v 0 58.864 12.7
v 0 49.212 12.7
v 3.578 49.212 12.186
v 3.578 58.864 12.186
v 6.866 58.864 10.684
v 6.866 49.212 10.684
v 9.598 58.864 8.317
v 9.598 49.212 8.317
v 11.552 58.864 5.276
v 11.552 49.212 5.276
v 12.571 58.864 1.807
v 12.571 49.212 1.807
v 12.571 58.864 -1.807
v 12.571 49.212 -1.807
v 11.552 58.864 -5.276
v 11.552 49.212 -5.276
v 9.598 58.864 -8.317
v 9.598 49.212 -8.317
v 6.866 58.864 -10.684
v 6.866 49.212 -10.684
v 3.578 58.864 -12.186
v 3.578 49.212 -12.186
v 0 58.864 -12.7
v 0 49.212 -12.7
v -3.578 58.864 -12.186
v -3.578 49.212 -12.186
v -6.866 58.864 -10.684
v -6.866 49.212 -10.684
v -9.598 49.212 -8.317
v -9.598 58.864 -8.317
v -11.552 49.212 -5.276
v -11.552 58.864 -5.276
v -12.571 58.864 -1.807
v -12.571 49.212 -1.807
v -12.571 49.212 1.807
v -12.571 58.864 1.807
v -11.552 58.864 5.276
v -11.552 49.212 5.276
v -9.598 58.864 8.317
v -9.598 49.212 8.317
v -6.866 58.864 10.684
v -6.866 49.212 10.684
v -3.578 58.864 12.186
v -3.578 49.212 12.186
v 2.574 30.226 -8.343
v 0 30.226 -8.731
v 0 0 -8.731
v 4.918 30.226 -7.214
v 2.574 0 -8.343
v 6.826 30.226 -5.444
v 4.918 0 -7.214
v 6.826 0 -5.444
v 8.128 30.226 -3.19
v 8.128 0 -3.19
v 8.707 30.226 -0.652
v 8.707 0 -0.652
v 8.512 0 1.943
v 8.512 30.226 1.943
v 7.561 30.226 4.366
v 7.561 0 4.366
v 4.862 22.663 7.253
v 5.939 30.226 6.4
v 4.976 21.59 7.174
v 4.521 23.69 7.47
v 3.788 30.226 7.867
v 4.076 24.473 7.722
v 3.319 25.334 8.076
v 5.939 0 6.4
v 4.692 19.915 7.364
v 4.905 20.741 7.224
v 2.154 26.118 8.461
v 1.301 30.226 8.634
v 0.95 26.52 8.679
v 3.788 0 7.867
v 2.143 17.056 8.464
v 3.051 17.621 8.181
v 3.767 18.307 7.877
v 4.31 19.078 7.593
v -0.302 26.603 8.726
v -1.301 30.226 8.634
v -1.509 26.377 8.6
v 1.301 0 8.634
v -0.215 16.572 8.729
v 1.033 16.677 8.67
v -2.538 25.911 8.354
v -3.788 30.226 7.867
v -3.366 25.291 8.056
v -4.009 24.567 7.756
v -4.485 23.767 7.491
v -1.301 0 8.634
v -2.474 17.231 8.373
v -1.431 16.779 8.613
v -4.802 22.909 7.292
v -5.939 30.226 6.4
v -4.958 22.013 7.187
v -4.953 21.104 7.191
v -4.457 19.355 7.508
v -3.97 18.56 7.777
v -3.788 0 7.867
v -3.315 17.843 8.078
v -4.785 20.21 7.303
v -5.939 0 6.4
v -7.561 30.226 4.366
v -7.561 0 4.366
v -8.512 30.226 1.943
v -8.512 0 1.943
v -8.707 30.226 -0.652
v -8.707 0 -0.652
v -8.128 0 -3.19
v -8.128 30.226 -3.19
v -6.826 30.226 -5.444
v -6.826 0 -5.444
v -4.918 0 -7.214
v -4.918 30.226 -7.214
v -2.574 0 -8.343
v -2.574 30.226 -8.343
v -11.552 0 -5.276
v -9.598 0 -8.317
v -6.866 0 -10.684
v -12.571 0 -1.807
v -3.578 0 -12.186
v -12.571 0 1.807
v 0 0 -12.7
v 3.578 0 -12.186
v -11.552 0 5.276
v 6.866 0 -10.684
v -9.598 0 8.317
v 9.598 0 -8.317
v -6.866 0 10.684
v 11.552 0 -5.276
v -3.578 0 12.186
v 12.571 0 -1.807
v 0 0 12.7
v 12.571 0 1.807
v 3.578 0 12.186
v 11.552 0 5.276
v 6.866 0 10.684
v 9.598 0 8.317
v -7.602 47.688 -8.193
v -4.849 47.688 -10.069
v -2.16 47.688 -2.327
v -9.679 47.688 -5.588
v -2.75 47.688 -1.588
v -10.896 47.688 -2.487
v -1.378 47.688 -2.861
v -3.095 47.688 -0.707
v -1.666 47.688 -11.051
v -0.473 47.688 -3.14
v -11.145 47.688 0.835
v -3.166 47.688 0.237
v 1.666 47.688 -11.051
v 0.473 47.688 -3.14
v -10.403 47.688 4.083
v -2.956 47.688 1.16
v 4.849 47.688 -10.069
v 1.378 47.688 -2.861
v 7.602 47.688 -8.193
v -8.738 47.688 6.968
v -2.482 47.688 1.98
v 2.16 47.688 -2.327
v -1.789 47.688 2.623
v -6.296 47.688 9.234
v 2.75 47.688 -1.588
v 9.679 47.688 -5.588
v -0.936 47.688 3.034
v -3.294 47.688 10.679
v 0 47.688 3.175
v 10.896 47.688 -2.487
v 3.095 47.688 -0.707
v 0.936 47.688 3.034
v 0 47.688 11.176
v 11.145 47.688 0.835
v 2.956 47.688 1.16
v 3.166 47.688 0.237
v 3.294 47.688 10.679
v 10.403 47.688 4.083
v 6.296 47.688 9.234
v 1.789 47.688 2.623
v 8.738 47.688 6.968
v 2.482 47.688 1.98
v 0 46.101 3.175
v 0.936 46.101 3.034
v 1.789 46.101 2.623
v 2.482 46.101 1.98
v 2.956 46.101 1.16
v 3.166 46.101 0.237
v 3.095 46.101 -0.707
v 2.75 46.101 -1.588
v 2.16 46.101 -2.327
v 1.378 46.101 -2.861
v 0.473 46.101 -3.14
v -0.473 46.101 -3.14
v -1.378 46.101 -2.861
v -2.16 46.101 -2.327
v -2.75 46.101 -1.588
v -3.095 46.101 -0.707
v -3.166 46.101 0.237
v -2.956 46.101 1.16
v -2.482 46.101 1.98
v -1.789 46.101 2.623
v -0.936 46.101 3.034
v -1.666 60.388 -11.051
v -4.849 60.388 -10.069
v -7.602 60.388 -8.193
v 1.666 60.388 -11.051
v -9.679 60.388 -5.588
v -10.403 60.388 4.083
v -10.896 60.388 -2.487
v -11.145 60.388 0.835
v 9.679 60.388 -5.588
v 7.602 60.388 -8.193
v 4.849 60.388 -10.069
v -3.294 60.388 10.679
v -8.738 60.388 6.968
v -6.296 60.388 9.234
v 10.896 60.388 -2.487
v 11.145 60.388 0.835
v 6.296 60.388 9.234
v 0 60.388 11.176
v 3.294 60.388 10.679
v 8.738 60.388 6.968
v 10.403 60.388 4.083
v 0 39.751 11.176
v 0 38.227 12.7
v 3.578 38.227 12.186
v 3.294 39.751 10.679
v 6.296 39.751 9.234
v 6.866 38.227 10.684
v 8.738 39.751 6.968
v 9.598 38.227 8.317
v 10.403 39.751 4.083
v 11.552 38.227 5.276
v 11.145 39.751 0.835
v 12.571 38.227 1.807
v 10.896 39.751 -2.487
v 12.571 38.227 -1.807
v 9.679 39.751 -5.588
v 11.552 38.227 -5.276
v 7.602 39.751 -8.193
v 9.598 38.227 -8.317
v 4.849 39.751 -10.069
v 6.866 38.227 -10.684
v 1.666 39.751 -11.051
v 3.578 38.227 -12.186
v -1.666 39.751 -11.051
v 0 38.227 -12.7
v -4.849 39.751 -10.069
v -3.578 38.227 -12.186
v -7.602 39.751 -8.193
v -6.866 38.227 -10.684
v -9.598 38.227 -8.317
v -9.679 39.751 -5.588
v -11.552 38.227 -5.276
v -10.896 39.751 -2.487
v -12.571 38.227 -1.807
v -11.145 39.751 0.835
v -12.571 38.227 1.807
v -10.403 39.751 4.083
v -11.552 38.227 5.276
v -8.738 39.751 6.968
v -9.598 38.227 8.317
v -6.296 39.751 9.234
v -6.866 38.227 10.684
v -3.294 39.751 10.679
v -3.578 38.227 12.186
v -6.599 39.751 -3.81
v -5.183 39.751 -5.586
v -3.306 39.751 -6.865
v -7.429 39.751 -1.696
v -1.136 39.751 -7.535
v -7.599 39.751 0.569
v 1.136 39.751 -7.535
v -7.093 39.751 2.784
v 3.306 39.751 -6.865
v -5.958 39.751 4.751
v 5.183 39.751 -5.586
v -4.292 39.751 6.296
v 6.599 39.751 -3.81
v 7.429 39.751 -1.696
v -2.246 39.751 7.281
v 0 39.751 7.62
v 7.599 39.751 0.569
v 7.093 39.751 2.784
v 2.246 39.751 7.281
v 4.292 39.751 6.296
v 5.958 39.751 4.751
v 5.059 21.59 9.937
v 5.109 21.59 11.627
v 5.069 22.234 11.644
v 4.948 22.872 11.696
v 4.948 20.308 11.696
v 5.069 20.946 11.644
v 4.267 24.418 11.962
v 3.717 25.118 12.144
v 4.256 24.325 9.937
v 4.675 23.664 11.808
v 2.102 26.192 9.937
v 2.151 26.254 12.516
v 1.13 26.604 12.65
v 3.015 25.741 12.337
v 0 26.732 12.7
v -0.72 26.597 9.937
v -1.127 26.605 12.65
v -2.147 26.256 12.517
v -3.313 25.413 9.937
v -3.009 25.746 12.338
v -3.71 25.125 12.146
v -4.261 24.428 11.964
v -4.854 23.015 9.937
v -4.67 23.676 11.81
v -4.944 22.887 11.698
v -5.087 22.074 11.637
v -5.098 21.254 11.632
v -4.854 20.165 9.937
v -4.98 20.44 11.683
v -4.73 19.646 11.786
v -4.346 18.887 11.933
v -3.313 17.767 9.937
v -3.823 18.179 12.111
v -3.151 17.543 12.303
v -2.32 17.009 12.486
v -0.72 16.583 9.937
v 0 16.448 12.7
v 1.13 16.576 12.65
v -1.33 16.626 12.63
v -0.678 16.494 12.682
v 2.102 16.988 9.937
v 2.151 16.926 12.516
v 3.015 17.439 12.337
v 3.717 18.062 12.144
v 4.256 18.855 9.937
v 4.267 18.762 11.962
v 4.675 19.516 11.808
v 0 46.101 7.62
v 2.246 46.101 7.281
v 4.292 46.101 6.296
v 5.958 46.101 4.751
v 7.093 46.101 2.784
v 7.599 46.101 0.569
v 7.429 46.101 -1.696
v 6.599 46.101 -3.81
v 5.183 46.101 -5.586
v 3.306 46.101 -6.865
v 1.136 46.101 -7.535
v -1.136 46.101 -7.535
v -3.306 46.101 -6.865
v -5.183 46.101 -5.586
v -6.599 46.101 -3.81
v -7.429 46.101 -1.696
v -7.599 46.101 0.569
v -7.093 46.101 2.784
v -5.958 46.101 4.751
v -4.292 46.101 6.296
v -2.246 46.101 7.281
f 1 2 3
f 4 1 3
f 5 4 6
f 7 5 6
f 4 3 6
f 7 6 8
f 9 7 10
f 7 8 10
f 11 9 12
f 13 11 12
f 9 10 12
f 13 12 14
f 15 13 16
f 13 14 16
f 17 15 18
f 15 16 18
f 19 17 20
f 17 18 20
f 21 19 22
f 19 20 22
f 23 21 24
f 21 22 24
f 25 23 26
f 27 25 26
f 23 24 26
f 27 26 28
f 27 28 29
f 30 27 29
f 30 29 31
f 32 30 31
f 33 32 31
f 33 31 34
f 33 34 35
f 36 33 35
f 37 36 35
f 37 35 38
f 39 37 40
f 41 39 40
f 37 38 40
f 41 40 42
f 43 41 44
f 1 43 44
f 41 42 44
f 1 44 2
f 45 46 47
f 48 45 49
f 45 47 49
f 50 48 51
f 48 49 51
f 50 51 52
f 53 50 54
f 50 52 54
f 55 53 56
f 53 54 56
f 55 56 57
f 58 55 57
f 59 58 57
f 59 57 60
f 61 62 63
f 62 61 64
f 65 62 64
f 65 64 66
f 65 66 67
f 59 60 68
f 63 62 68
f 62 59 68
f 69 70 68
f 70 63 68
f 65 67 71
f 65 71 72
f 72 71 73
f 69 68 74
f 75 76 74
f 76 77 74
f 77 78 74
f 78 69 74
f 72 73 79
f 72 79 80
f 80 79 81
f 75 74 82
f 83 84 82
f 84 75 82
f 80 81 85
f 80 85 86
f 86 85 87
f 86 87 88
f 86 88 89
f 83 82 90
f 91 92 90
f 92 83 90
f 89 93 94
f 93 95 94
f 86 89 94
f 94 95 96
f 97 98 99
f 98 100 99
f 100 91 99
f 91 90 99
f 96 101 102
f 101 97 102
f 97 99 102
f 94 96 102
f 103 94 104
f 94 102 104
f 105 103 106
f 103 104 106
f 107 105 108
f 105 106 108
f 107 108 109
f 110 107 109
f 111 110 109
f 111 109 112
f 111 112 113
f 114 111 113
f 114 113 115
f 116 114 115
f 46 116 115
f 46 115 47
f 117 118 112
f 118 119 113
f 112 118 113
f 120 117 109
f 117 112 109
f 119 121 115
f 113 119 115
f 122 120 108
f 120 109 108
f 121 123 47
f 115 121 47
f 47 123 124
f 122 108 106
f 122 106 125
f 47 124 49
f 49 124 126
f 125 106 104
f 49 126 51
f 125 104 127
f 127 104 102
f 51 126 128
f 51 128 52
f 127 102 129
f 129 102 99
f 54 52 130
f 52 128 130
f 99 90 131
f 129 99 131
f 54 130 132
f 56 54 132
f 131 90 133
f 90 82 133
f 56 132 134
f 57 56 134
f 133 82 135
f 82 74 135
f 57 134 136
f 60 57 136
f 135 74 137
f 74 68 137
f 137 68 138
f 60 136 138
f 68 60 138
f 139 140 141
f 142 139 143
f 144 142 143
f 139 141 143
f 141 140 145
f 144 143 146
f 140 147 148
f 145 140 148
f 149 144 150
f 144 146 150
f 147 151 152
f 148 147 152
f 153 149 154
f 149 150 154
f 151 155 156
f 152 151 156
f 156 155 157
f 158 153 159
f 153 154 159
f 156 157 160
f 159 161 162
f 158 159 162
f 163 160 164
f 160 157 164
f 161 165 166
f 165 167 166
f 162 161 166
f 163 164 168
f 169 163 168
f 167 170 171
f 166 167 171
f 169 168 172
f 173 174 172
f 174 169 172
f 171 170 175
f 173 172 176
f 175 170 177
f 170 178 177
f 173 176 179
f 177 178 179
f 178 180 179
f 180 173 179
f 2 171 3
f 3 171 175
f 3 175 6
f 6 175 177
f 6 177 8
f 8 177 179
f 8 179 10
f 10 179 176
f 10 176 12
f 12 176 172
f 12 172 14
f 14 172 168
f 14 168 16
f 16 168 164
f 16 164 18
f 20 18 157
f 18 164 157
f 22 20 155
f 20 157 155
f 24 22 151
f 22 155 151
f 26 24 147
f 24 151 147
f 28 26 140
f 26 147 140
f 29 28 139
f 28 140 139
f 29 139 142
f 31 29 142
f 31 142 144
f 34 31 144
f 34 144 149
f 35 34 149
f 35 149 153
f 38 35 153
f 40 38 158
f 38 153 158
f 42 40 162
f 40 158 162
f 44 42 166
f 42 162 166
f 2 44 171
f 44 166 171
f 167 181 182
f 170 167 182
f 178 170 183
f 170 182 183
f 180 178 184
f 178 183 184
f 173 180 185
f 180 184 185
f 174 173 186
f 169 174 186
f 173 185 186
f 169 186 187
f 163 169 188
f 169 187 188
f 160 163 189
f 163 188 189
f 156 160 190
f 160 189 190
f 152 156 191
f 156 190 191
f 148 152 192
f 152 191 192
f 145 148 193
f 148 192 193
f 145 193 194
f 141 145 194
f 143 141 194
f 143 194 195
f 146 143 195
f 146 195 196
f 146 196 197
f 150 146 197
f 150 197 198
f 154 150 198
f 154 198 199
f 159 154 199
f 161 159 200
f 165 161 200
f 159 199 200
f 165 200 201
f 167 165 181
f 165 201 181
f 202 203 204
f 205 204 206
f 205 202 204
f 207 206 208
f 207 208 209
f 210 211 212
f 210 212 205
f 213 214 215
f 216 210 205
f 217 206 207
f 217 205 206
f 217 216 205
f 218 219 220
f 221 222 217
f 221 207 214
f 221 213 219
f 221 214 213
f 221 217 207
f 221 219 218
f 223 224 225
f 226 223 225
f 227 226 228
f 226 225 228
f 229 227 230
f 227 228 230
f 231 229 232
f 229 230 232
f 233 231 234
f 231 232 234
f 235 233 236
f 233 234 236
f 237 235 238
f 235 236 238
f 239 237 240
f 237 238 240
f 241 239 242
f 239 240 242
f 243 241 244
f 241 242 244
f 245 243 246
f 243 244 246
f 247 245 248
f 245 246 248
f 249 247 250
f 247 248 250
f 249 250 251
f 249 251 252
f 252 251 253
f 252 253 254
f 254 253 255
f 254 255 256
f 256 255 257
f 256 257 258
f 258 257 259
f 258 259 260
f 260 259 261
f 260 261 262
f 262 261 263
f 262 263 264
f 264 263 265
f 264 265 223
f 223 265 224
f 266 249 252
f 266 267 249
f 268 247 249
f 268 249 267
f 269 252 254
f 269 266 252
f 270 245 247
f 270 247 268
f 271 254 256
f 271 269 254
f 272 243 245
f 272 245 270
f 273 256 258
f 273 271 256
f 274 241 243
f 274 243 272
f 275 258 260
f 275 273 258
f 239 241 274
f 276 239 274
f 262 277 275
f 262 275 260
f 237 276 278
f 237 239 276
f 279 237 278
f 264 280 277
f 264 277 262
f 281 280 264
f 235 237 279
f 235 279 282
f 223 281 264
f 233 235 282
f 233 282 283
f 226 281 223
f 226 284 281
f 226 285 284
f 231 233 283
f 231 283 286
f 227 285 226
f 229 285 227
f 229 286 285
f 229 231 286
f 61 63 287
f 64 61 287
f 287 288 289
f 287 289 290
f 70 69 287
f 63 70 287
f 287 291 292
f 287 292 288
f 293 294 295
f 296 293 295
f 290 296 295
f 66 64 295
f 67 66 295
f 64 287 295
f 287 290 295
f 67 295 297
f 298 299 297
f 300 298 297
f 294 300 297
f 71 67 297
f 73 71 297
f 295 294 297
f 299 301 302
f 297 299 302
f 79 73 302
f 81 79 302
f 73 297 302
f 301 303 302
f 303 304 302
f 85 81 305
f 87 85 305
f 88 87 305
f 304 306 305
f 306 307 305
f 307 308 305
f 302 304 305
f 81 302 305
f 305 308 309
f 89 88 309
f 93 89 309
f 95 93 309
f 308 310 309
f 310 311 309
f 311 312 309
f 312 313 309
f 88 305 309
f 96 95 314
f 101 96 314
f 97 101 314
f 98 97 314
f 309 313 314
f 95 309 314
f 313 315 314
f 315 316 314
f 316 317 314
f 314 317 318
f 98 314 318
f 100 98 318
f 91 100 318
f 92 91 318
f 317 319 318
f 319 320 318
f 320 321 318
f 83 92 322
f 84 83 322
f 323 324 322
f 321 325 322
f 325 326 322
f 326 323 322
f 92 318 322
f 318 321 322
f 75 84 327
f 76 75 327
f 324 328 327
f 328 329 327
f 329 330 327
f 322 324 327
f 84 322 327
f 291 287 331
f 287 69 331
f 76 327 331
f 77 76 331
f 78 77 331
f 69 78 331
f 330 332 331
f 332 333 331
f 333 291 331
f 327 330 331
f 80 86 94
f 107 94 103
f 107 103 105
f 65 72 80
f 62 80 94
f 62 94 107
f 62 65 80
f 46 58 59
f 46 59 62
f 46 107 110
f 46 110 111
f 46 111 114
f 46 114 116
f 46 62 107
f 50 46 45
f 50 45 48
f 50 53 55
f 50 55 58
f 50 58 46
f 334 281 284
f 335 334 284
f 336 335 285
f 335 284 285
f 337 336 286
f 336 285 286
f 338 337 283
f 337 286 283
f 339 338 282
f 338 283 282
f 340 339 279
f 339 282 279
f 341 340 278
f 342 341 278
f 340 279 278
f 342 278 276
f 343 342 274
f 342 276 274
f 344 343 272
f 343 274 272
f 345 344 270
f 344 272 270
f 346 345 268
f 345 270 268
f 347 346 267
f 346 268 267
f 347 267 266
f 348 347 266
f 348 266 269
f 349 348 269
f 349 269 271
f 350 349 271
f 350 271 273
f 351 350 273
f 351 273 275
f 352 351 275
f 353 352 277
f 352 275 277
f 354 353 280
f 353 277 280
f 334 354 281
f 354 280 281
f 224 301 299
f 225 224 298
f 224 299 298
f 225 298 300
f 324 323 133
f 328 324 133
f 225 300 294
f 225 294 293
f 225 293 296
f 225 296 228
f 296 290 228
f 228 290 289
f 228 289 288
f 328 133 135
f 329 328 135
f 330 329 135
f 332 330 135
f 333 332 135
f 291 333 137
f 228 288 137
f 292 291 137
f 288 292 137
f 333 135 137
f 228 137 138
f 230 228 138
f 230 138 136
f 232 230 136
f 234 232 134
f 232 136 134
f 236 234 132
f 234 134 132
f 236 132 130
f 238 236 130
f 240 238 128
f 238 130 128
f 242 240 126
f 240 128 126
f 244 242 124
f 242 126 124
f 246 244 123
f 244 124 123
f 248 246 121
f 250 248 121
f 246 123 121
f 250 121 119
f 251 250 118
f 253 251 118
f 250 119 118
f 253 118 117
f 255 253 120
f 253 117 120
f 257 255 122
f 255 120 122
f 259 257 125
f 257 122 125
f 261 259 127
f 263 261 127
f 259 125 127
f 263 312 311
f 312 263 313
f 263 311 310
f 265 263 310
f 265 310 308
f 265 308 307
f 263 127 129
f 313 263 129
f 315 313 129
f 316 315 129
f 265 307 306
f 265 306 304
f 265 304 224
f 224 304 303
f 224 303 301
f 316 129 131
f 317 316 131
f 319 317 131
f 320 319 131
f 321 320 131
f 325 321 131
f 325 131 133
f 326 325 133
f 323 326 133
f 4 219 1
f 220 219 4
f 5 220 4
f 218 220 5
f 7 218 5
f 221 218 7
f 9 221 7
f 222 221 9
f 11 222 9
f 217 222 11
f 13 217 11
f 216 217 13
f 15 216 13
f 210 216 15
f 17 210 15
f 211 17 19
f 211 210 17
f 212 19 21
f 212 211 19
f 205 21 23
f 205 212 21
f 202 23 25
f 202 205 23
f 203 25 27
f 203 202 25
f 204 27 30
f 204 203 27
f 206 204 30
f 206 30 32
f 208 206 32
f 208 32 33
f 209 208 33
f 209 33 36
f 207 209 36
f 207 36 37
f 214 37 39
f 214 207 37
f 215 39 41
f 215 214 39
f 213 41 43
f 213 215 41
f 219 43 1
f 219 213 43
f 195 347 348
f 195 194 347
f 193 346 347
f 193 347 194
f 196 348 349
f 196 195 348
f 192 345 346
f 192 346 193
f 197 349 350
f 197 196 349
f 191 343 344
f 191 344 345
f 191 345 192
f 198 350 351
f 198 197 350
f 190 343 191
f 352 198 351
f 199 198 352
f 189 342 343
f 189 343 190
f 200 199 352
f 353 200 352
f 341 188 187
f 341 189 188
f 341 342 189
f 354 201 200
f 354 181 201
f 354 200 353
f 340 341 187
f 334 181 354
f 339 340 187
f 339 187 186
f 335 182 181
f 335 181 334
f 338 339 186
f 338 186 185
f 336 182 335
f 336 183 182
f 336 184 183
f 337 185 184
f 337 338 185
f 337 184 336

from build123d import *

# Parameters (mm, degrees)
SKETCH1_R           = 12.7
BOSS_EXTRUDE1_DEPTH = 39.751
SKETCH2_R           = 8.73125
CUT_EXTRUDE1_DEPTH  = 30.226
SKETCH4_R           = 7.62
BOSS_EXTRUDE2_DEPTH = 6.35
SKETCH5_R           = 3.175
BOSS_EXTRUDE3_DEPTH = 1.5875
SKETCH7_R           = 12.7
BOSS_EXTRUDE4_DEPTH = 12.7
CHAMFER1_SIZE       = 1.524


# Read off the part's stored shape, not the designer's step: 1/8 NPT Tapped Hole1
with BuildPart() as part:
    # Sketch1 → Boss-Extrude1 (new body)
    with BuildSketch(Plane(origin=(0, 0, 0), x_dir=(1, 0, 0), z_dir=(0, 1, 0))):
        with Locations(Location((0, 0, 0), (0, 0, 270))):
            Circle(SKETCH1_R)
    extrude(amount=BOSS_EXTRUDE1_DEPTH)

    # Sketch2 → Cut-Extrude1 (cut)
    with BuildSketch(Plane.XZ):
        with Locations(Location((0, 0, 0), (0, 0, 270))):
            Circle(SKETCH2_R)
    extrude(amount=-CUT_EXTRUDE1_DEPTH, mode=Mode.SUBTRACT)

    # Sketch4 → Boss-Extrude2 (add)
    with BuildSketch(Plane(origin=(0, 39.751, 0), x_dir=(1, 0, 0), z_dir=(0, 1, 0))):
        with Locations(Location((0, 0, 0), (0, 0, 270))):
            Circle(SKETCH4_R)
    extrude(amount=BOSS_EXTRUDE2_DEPTH)

    # Sketch5 → Boss-Extrude3 (add)
    with BuildSketch(Plane(origin=(0, 46.101, 0), x_dir=(1, 0, 0), z_dir=(0, 1, 0))):
        with Locations(Location((0, 0, 0), (0, 0, 270))):
            Circle(SKETCH5_R)
    extrude(amount=BOSS_EXTRUDE3_DEPTH)

    # Sketch7 → Boss-Extrude4 (add)
    with BuildSketch(Plane(origin=(0, 47.6885, 0), x_dir=(1, 0, 0), z_dir=(0, 1, 0))):
        with Locations(Location((0, 0, 0), (0, 0, 270))):
            Circle(SKETCH7_R)
    extrude(amount=BOSS_EXTRUDE4_DEPTH)

    # Chamfer1
    chamfer1_edges = [part.edges().sort_by_distance(p)[0] for p in [
        (0, 47.6885, -12.7),
        (0, 60.3885, -12.7),
        (0, 39.751, -12.7),
    ]]
    chamfer(chamfer1_edges, length=CHAMFER1_SIZE)

    # 1/8 NPT Tapped Hole1 outline → 1/8 NPT Tapped Hole1 (revolve, cut)
    with BuildSketch(Plane.XZ.offset(-21.59)):
        Polygon((5.141518805, 12.700000181), (0, 12.700000181), (0, 7.174156466), (4.976067645, 7.174156466), align=None)
    revolve(axis=Axis((0, 21.59, 0), (0, 0, 1)), mode=Mode.SUBTRACT)


solid = part.part
